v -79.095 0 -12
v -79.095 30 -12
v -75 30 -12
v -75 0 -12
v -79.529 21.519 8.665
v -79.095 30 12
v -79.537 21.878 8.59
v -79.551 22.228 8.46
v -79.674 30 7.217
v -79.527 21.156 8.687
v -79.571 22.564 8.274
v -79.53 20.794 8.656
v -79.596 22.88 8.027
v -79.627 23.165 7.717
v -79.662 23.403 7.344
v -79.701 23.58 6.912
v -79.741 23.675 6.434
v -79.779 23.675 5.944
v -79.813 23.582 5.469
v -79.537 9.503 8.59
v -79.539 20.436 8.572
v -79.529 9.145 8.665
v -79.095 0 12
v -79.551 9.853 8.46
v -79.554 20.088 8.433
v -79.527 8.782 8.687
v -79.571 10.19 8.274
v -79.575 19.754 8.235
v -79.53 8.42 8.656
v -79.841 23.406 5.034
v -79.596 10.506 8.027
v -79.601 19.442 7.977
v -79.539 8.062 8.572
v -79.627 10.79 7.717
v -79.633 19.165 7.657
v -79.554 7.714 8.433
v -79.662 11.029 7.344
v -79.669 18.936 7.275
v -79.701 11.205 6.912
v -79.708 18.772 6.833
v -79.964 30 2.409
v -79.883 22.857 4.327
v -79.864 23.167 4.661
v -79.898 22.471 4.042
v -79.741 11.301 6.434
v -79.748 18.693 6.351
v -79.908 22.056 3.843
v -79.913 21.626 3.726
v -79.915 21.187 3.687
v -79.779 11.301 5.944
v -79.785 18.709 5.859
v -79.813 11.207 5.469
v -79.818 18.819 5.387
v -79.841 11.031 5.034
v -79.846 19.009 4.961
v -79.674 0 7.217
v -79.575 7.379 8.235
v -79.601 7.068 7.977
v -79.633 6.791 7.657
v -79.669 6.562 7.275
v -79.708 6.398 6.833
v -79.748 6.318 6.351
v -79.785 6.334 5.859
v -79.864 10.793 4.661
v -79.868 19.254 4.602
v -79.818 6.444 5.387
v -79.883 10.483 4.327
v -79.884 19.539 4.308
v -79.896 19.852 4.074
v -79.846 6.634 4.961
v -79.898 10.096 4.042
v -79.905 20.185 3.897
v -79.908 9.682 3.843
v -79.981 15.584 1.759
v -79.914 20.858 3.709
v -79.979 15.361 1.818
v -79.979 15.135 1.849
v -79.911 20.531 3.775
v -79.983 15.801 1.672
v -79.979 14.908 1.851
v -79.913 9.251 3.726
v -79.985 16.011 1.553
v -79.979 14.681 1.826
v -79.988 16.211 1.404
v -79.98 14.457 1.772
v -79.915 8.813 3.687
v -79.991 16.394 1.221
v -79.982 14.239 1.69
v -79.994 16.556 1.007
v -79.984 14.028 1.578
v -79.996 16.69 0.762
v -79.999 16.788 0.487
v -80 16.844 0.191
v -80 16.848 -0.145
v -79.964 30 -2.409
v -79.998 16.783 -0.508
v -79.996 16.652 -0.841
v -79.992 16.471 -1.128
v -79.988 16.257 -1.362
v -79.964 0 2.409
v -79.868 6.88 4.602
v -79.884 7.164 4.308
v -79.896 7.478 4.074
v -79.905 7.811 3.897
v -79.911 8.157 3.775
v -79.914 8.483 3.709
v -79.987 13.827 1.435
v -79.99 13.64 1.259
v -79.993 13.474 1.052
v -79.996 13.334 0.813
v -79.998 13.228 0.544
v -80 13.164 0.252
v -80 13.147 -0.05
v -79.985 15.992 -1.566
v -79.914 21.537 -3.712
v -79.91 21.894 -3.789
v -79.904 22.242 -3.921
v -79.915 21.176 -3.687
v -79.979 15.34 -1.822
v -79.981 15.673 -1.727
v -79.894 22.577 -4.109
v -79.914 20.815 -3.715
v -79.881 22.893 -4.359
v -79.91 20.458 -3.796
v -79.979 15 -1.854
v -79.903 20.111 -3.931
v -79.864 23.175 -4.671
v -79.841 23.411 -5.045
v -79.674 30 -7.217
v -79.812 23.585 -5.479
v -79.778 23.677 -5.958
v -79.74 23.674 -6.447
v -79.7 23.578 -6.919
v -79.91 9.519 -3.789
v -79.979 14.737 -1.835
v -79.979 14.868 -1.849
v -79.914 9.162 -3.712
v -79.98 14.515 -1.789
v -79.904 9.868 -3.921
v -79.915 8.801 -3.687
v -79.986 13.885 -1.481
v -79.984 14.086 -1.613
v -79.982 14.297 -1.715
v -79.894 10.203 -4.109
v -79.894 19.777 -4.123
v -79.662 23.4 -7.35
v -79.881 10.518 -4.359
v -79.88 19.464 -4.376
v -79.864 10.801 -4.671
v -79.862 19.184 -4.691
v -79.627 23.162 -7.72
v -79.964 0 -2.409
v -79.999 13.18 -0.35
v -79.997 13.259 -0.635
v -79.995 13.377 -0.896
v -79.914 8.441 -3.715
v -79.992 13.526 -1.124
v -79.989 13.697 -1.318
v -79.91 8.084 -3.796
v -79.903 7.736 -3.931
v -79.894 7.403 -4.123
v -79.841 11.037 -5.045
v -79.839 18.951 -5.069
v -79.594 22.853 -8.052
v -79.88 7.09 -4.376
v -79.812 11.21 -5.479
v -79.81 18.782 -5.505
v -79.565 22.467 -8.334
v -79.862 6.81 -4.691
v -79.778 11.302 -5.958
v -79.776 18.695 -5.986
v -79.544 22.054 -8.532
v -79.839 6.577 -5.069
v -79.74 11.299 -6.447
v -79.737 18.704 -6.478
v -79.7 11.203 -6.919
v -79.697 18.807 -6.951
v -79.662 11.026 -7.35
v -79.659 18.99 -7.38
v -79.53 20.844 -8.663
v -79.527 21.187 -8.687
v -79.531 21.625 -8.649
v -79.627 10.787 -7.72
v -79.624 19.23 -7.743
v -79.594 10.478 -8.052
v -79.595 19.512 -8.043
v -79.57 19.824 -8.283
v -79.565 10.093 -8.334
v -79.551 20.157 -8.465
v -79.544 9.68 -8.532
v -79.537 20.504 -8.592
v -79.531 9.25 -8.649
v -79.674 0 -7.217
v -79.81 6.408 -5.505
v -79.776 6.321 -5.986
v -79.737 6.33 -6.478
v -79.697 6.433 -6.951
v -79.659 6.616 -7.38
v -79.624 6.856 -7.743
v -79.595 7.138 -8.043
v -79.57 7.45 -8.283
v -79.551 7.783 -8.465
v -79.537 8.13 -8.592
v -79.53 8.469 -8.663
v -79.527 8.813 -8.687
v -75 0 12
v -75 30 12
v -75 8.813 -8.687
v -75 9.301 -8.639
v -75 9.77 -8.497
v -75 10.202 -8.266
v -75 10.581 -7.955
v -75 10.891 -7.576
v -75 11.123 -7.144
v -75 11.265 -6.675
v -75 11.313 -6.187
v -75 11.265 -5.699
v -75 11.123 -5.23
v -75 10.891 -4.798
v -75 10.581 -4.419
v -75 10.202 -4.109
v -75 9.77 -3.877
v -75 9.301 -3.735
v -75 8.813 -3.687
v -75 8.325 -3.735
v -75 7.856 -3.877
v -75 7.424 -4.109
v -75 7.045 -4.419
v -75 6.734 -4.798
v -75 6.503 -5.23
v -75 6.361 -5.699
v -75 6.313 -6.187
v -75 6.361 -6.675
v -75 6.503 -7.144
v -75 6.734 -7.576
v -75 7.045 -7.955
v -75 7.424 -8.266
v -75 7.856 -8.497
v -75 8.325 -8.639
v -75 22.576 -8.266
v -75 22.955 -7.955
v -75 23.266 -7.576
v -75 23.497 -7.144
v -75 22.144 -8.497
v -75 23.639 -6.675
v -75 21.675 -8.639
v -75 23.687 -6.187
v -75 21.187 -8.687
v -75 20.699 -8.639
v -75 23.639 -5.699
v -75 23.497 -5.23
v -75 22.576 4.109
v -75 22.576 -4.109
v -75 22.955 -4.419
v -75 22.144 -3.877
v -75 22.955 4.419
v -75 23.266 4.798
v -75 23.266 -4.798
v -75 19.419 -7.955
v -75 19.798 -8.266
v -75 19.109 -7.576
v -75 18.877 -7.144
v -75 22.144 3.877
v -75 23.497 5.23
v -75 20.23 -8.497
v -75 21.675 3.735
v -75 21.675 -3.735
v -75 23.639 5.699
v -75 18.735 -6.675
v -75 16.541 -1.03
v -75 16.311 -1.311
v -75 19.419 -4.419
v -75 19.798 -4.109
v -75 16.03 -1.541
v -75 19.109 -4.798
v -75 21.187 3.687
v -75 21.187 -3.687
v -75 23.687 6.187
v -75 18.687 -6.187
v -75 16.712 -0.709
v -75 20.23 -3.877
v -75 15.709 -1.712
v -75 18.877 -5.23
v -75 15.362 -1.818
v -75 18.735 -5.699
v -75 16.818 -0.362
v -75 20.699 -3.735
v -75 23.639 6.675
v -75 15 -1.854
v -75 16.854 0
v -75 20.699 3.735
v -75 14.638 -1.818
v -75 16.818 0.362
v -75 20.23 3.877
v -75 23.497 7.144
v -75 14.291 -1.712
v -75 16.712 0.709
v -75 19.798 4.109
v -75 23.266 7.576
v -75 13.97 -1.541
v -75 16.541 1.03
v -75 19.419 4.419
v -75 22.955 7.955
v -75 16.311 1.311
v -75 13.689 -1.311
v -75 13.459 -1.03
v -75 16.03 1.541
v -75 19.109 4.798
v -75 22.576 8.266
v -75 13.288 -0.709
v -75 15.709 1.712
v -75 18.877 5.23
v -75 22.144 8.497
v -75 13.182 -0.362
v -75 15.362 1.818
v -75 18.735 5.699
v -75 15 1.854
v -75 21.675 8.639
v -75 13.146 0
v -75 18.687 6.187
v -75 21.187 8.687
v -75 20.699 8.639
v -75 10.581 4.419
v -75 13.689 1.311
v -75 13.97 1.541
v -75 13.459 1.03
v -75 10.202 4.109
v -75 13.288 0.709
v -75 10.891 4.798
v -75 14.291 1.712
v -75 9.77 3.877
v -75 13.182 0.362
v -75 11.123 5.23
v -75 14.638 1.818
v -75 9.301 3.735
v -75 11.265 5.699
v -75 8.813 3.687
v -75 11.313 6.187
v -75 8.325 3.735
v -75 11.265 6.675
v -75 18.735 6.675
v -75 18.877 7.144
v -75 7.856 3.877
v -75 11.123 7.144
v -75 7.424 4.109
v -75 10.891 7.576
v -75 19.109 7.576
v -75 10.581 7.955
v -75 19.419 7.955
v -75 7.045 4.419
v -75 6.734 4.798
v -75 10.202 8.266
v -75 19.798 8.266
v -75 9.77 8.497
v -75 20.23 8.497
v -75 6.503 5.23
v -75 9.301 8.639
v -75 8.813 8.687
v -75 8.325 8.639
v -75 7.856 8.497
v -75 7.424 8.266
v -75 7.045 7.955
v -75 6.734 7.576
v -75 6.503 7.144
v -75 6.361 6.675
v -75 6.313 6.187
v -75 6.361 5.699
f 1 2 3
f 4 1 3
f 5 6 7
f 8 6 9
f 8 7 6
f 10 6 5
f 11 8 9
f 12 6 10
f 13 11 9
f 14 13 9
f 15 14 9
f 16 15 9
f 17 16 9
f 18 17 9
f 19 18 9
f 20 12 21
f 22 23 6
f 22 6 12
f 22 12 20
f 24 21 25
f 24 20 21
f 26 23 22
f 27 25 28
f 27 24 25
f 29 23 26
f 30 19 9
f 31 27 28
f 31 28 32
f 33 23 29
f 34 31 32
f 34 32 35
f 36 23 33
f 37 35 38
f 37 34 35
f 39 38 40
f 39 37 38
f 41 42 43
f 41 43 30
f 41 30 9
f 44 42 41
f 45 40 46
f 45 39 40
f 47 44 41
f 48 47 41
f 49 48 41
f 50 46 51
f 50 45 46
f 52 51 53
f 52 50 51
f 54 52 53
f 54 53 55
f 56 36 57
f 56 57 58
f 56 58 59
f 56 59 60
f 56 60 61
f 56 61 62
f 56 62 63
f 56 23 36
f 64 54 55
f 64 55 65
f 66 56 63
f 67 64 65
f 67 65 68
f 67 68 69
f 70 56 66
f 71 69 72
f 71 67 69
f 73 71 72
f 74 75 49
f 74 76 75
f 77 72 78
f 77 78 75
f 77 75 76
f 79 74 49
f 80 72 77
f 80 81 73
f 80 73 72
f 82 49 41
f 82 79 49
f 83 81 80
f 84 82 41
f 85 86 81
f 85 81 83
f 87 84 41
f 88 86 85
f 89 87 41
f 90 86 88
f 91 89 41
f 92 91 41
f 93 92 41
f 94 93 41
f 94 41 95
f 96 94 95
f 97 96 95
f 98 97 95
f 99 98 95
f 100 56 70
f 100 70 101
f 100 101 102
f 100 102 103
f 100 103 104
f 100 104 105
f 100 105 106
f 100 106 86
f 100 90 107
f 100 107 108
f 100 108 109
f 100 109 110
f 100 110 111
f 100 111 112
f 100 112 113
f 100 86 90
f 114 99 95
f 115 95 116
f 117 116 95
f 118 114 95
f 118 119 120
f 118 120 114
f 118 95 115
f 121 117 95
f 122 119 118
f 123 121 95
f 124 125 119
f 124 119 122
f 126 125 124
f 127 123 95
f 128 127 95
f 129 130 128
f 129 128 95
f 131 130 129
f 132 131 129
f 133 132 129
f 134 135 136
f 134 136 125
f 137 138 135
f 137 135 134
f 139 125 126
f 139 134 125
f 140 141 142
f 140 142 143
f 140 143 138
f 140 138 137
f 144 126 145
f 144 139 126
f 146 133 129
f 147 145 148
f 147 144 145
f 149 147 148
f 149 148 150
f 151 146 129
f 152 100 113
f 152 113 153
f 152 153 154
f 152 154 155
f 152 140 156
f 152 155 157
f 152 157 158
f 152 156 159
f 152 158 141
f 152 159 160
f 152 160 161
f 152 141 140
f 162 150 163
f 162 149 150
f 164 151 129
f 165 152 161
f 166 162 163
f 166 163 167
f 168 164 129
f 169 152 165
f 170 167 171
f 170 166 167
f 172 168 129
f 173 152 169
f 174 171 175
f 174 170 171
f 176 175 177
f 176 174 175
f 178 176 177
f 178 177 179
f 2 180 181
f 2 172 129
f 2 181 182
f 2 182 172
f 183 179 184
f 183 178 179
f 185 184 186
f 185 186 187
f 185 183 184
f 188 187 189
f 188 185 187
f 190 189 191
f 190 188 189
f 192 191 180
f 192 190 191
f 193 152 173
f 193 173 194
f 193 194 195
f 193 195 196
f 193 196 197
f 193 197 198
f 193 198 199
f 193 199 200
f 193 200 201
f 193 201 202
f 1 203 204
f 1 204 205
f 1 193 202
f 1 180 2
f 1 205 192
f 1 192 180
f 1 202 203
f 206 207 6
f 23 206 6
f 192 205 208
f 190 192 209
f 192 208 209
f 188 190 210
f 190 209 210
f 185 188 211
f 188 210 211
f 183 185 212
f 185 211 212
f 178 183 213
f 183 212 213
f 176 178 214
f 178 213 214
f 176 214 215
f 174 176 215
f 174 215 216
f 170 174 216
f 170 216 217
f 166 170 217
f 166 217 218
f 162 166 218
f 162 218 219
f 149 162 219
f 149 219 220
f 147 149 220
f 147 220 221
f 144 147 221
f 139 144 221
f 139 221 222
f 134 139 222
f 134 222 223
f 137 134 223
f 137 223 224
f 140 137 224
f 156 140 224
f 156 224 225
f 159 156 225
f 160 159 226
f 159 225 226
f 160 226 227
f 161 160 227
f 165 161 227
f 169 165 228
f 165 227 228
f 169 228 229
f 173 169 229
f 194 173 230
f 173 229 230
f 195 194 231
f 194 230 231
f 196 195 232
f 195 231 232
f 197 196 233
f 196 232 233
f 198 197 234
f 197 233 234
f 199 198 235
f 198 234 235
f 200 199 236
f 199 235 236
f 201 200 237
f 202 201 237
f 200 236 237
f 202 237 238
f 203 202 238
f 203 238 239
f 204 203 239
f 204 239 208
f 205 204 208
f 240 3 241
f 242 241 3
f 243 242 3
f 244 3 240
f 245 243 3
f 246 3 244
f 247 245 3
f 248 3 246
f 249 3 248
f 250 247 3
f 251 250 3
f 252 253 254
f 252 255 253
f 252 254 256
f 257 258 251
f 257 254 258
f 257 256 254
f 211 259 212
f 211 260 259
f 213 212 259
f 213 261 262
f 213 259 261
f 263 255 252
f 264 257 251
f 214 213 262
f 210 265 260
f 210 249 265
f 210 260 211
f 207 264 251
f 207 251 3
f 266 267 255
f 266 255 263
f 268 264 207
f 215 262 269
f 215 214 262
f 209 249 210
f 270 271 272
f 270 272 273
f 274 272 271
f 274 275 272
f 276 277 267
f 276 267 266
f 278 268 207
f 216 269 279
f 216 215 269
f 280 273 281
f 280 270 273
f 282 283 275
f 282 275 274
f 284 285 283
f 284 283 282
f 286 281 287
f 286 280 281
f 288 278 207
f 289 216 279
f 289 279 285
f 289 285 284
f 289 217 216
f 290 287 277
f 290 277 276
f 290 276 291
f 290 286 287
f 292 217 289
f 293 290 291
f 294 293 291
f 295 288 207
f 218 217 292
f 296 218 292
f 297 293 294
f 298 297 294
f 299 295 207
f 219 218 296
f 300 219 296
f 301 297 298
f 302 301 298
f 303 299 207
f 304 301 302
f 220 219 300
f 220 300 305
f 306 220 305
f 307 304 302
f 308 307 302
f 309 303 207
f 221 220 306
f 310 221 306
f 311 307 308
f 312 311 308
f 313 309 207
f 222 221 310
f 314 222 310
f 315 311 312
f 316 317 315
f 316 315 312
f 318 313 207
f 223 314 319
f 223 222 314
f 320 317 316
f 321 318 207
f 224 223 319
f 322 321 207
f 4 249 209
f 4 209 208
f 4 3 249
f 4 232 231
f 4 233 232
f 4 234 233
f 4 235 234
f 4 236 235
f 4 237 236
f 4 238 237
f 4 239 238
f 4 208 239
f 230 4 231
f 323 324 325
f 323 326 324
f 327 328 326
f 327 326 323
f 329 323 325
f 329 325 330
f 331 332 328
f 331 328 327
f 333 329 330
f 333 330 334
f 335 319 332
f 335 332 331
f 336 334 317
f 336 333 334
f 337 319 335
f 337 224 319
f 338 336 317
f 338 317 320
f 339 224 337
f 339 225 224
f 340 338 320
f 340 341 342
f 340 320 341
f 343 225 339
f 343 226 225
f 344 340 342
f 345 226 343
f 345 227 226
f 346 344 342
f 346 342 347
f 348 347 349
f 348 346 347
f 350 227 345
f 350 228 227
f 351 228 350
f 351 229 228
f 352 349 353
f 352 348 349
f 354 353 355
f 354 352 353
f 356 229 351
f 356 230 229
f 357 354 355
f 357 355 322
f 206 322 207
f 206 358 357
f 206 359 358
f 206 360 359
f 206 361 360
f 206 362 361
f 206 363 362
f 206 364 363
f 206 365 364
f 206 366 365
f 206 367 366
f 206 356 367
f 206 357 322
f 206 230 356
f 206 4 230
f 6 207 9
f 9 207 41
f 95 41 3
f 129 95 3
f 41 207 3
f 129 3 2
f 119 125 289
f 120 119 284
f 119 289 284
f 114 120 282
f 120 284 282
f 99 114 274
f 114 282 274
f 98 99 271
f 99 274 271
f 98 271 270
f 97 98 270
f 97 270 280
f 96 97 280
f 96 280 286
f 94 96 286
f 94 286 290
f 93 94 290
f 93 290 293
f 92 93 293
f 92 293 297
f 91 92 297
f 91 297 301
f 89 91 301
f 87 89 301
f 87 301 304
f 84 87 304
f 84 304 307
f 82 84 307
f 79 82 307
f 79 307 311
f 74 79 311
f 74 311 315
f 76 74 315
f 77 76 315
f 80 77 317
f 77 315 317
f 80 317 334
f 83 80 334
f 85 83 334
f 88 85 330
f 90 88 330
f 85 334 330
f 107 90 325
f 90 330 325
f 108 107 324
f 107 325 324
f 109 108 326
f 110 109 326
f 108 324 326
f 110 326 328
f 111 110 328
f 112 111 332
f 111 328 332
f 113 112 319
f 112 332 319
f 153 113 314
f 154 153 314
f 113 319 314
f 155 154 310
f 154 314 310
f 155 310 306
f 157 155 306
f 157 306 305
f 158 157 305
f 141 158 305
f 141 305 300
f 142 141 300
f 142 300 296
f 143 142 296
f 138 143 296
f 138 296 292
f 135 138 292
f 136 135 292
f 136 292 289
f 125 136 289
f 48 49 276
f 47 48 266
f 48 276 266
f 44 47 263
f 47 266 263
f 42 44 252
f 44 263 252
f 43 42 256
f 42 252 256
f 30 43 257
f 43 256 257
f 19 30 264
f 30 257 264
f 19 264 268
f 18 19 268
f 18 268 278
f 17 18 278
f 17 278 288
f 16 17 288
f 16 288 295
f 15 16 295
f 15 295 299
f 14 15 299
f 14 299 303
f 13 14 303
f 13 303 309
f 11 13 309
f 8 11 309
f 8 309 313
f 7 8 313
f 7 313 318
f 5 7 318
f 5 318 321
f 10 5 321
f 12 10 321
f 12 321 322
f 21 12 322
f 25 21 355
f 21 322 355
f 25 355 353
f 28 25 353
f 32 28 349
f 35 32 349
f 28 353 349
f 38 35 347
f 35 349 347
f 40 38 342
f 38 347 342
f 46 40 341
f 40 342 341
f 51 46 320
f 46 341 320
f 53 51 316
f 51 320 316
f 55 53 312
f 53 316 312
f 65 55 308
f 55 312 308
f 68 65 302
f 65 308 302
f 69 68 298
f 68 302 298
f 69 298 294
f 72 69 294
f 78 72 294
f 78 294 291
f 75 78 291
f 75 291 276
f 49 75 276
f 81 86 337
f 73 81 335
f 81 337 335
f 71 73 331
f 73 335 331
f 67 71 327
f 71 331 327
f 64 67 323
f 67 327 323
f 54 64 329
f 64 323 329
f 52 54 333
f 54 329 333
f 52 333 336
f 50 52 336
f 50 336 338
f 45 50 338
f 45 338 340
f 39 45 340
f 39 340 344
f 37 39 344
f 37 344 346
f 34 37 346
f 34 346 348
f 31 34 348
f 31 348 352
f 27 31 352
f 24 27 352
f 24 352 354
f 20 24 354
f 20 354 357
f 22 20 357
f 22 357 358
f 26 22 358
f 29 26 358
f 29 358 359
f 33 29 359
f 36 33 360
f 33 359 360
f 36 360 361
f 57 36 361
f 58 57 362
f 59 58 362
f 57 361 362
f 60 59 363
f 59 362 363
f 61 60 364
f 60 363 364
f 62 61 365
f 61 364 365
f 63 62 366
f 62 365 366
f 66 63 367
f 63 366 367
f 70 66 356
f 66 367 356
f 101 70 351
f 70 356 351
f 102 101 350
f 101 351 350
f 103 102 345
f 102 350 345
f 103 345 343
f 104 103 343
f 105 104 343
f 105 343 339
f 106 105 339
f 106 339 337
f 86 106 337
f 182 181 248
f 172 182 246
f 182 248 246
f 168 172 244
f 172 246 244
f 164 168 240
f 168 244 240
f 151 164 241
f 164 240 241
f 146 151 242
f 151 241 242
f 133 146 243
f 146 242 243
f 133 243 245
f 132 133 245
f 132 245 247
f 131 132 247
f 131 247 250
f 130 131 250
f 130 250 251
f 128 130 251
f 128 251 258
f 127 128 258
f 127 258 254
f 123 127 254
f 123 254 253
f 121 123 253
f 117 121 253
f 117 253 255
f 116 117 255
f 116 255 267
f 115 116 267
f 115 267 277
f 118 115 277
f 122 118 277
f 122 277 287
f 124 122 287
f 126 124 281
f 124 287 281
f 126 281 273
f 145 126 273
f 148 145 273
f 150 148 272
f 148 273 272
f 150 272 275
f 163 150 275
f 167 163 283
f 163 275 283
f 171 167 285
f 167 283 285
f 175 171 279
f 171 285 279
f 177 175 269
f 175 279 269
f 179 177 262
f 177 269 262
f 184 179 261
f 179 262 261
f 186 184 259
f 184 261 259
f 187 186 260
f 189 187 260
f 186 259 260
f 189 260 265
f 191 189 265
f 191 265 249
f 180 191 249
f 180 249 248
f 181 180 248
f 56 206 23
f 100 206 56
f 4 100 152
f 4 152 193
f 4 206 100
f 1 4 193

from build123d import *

# Parameters (mm, degrees)
BOSS_EXTRUDE1_DEPTH = 30
SKETCH2_R           = 1.853585504
SKETCH2_R_2         = 2.5
CUT_EXTRUDE1_DEPTH  = 18


with BuildPart() as part:
    # Sketch1 → Boss-Extrude1 (new body)
    with BuildSketch(Plane(origin=(0, 0, 0), x_dir=(1, 0, 0), z_dir=(0, 1, 0))):
        with BuildLine():
            Line((-79.094879733, 12), (-75, 12))
            Line((-75, 12), (-75, -12))
            Line((-75, -12), (-79.094879733, -12))
            ThreePointArc((-79.094879733, -12), (-80, 0), (-79.094879733, 12))
        make_face()
    extrude(amount=BOSS_EXTRUDE1_DEPTH)

    # Sketch2 → Cut-Extrude1 (cut)
    with BuildSketch(Plane(origin=(-75, 0, 0), x_dir=(0, 0, -1), z_dir=(1, 0, 0))):
        with Locations((0, 15)):
            Circle(SKETCH2_R)
        with Locations((6.187184335, 21.187184335)):
            Circle(SKETCH2_R_2)
        with Locations((6.187184335, 8.812815665)):
            Circle(SKETCH2_R_2)
        with Locations((-6.187184335, 8.812815665)):
            Circle(SKETCH2_R_2)
        with Locations((-6.187184335, 21.187184335)):
            Circle(SKETCH2_R_2)
    extrude(amount=-CUT_EXTRUDE1_DEPTH, mode=Mode.SUBTRACT)


solid = part.part
